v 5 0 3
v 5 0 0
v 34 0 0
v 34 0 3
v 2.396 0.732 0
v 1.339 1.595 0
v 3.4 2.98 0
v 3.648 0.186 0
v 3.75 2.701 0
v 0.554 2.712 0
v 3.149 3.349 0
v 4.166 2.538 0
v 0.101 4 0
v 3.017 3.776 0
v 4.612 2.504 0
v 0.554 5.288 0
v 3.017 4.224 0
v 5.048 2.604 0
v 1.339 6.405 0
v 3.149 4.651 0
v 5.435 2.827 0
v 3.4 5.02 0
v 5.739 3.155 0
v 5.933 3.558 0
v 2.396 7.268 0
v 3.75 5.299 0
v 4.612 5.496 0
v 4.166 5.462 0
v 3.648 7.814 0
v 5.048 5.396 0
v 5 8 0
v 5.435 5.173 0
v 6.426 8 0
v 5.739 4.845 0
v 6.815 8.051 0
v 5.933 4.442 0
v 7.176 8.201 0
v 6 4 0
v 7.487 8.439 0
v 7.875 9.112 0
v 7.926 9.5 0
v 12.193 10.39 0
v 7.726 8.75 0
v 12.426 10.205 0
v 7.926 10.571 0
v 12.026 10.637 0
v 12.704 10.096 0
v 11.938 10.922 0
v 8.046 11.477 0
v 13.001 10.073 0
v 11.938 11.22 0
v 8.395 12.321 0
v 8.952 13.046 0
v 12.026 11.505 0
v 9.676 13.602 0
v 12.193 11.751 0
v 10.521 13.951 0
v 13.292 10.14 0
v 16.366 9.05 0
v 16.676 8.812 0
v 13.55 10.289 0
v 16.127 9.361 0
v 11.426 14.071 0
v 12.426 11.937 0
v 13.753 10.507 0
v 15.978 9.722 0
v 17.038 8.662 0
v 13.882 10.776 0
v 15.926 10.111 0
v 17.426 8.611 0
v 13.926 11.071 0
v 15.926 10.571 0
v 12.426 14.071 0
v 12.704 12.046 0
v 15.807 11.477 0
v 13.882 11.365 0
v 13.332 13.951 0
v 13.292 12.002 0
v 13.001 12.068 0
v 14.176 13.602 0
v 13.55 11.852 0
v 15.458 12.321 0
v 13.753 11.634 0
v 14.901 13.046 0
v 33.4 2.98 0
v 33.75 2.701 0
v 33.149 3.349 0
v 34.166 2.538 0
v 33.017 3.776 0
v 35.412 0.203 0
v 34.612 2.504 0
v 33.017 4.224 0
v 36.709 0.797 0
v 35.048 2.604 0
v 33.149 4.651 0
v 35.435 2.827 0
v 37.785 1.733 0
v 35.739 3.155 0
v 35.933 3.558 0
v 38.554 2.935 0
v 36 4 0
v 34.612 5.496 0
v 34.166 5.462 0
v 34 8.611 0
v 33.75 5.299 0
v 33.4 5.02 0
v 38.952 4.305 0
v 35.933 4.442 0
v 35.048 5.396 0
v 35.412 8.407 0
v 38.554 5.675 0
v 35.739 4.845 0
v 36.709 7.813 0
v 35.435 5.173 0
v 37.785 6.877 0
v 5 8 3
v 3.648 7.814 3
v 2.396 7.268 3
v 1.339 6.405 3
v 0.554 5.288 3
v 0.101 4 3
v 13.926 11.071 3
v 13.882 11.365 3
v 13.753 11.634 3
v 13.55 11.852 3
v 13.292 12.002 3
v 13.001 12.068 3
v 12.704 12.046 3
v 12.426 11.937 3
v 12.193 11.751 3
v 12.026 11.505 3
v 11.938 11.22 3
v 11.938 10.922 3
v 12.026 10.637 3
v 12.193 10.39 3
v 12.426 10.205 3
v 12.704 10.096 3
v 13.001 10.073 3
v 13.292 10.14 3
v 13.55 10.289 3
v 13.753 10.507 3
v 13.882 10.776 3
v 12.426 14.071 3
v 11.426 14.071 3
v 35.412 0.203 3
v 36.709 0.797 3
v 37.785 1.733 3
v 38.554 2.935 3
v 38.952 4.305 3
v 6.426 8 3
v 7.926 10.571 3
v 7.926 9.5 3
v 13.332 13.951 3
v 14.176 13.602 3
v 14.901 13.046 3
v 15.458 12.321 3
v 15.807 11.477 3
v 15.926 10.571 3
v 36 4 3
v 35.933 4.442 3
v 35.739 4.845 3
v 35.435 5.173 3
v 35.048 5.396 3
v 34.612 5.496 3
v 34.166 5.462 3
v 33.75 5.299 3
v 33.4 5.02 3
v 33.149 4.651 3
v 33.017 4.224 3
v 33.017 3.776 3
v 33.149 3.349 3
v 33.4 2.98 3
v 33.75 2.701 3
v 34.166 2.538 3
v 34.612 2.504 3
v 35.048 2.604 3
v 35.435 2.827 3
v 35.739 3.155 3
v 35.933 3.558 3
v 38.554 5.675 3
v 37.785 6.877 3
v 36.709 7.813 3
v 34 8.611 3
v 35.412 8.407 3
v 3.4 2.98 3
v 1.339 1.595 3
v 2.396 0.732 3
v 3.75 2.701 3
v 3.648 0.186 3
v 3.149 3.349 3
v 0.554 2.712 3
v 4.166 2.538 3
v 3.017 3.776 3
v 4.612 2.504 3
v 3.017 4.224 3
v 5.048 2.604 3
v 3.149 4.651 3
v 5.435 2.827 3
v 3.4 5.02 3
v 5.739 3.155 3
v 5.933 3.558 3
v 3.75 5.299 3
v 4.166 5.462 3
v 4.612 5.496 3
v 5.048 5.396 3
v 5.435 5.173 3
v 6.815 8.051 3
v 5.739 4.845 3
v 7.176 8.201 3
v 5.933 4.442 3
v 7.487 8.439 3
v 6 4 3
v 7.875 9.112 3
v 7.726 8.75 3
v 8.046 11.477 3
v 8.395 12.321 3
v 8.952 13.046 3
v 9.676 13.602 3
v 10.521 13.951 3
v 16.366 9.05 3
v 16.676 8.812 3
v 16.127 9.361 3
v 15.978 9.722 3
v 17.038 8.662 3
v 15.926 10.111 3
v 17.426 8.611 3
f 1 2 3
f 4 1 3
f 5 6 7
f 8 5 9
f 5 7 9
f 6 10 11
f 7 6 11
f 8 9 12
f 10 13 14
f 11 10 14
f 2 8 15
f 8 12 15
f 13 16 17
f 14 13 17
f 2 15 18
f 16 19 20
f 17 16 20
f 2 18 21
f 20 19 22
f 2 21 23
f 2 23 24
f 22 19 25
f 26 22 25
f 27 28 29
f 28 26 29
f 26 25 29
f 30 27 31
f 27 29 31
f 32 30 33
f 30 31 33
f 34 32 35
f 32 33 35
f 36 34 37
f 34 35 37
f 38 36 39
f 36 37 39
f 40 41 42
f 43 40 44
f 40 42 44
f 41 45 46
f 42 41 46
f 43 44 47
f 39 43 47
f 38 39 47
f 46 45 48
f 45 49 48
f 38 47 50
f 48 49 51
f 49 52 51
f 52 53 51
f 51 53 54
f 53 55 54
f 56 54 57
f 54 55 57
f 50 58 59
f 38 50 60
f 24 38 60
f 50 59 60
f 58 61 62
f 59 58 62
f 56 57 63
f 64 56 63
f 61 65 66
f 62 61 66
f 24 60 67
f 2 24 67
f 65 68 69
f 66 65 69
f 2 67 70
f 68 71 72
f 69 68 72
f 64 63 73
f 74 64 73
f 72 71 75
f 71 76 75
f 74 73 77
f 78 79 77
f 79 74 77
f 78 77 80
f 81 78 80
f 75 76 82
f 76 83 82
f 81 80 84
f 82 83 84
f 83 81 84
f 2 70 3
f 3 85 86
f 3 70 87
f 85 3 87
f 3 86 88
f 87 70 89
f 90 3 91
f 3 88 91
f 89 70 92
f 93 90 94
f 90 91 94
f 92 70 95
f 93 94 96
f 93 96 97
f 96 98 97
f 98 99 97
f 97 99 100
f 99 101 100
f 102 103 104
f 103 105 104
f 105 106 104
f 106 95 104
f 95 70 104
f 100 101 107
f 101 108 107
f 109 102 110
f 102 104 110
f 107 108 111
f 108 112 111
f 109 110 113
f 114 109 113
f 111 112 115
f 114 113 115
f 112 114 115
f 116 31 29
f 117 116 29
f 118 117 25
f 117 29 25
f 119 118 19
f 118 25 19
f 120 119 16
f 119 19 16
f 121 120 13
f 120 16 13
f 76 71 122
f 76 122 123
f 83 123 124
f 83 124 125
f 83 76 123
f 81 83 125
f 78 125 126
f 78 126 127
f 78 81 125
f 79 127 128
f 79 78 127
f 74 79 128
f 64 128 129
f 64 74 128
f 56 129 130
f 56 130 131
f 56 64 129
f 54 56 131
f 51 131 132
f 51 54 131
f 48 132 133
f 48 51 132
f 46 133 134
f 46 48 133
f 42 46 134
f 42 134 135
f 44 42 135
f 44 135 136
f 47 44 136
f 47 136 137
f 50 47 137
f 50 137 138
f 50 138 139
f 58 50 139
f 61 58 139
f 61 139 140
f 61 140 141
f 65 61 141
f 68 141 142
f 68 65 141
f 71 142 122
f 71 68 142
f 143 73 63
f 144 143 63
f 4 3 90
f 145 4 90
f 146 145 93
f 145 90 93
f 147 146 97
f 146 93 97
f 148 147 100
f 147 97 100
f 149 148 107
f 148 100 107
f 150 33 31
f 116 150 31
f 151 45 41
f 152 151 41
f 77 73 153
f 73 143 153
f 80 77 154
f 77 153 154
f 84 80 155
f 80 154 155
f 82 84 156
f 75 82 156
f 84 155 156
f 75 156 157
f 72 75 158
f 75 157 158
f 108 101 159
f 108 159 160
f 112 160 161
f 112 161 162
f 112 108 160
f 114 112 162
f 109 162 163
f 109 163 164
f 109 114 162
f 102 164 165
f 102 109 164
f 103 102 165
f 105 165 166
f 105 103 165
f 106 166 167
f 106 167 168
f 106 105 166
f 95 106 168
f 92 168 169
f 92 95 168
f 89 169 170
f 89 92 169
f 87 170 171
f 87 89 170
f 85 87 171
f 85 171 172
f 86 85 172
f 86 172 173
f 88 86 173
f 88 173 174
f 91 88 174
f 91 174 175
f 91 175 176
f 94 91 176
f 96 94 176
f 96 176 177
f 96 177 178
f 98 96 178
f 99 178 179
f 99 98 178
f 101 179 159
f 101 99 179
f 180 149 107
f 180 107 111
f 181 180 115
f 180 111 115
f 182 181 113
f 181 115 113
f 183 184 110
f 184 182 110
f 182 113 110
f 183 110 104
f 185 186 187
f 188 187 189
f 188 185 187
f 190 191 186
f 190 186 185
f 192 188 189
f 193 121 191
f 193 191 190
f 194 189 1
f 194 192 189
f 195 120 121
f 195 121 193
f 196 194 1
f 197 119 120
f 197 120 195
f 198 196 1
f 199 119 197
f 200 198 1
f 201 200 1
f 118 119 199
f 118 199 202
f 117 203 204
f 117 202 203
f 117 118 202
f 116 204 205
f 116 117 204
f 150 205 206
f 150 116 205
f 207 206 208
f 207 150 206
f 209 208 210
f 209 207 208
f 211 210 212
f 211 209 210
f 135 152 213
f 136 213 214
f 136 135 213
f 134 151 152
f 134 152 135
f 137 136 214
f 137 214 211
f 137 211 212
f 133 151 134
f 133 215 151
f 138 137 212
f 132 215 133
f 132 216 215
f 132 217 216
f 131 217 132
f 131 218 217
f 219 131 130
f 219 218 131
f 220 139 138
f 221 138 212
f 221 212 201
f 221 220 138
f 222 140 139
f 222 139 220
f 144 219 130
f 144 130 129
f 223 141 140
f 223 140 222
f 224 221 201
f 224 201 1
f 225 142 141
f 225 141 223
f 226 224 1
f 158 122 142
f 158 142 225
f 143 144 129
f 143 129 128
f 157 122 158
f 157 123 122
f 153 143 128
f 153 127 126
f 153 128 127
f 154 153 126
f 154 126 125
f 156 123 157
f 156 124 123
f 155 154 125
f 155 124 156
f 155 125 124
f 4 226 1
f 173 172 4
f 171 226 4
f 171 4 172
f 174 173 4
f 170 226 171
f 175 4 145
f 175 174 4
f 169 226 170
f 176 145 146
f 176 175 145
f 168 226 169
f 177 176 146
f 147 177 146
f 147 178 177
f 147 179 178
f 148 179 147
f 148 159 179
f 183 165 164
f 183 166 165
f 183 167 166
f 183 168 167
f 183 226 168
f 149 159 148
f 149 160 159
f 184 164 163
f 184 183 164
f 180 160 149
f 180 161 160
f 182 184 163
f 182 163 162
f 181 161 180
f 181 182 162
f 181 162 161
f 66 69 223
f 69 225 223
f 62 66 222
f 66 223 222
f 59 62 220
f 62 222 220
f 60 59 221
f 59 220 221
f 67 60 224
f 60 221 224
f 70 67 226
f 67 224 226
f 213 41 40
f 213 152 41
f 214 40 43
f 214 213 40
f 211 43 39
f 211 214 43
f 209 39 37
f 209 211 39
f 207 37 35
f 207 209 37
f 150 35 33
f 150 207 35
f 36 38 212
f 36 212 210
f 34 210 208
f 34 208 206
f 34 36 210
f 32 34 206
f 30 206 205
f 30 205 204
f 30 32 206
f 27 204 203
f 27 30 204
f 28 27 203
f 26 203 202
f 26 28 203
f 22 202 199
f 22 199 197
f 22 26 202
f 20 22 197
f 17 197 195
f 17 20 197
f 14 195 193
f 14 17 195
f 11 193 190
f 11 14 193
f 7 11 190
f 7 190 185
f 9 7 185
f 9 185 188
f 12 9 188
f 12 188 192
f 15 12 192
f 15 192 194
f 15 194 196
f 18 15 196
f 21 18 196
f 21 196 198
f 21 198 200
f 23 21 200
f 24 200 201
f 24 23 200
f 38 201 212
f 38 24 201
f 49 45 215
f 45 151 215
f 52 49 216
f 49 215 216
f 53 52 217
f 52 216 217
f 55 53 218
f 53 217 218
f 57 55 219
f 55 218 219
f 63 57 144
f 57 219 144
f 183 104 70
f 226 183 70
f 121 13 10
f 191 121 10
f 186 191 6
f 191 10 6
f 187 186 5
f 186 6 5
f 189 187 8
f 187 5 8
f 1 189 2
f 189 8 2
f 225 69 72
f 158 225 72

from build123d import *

# Parameters (mm, degrees)
SKETCH1_R           = 1.5
SKETCH1_R_2         = 1
BOSS_EXTRUDE1_DEPTH = 3
FILLET1_R           = 5
FILLET2_R           = 3.5
FILLET3_R           = 1.5


with BuildPart() as part:
    # Sketch1 → Boss-Extrude1 (new body)
    with BuildSketch(Plane.XY):
        Polygon((0, 0), (39, 0), (39, 8.610580904), (15.926488874, 8.610580904), (15.926488874, 14.070663707), (7.926488874, 14.070663707), (7.926488874, 8), (0, 8), align=None)
        with Locations((4.5, 4)):
            Circle(SKETCH1_R, mode=Mode.SUBTRACT)
        with Locations((34.5, 4)):
            Circle(SKETCH1_R, mode=Mode.SUBTRACT)
        with Locations((12.926488874, 11.070663707)):
            Circle(SKETCH1_R_2, mode=Mode.SUBTRACT)
    extrude(amount=BOSS_EXTRUDE1_DEPTH)

    # Fillet1
    # the kernel refuses this fillet: 5 mm, written as the material it takes off along each edge
    with BuildSketch(Plane(origin=(39, 8.610580904, -12.5), x_dir=(0, -1, 0), z_dir=(0, 0, 1)), Plane(origin=(39, 0, -12.5), x_dir=(-1, 0, 0), z_dir=(0, 0, 1)), Plane(origin=(0, 8, -12.5), x_dir=(1, 0, 0), z_dir=(0, 0, 1))) as fillet1_piece_1:
        with BuildLine():
            CenterArc((FILLET1_R, -FILLET1_R), FILLET1_R, 90, 90)
            Line((0, -FILLET1_R), (0, 0))
            Line((0, 0), (FILLET1_R, 0))
        make_face()
    extrude(amount=28, mode=Mode.SUBTRACT)
    with BuildSketch(Plane(origin=(0, 0, -12.5), x_dir=(1, 0, 0), z_dir=(0, 0, 1))) as fillet1_piece_2:
        with BuildLine():
            CenterArc((FILLET1_R, FILLET1_R), FILLET1_R, 180, 90)
            Line((0, FILLET1_R), (0, 0))
            Line((0, 0), (FILLET1_R, 0))
        make_face()
    extrude(amount=28, mode=Mode.SUBTRACT)

    # Fillet2
    fillet2_edges = [part.edges().sort_by_distance(p)[0] for p in [
        (7.926488874, 14.070663707, 1.5),
        (15.926488874, 14.070663707, 1.5),
    ]]
    fillet(fillet2_edges, radius=FILLET2_R)

    # Fillet3
    fillet3_edges = [part.edges().sort_by_distance(p)[0] for p in [
        (7.926488874, 8, 1.5),
        (15.926488874, 8.610580904, 1.5),
    ]]
    fillet(fillet3_edges, radius=FILLET3_R)


solid = part.part
